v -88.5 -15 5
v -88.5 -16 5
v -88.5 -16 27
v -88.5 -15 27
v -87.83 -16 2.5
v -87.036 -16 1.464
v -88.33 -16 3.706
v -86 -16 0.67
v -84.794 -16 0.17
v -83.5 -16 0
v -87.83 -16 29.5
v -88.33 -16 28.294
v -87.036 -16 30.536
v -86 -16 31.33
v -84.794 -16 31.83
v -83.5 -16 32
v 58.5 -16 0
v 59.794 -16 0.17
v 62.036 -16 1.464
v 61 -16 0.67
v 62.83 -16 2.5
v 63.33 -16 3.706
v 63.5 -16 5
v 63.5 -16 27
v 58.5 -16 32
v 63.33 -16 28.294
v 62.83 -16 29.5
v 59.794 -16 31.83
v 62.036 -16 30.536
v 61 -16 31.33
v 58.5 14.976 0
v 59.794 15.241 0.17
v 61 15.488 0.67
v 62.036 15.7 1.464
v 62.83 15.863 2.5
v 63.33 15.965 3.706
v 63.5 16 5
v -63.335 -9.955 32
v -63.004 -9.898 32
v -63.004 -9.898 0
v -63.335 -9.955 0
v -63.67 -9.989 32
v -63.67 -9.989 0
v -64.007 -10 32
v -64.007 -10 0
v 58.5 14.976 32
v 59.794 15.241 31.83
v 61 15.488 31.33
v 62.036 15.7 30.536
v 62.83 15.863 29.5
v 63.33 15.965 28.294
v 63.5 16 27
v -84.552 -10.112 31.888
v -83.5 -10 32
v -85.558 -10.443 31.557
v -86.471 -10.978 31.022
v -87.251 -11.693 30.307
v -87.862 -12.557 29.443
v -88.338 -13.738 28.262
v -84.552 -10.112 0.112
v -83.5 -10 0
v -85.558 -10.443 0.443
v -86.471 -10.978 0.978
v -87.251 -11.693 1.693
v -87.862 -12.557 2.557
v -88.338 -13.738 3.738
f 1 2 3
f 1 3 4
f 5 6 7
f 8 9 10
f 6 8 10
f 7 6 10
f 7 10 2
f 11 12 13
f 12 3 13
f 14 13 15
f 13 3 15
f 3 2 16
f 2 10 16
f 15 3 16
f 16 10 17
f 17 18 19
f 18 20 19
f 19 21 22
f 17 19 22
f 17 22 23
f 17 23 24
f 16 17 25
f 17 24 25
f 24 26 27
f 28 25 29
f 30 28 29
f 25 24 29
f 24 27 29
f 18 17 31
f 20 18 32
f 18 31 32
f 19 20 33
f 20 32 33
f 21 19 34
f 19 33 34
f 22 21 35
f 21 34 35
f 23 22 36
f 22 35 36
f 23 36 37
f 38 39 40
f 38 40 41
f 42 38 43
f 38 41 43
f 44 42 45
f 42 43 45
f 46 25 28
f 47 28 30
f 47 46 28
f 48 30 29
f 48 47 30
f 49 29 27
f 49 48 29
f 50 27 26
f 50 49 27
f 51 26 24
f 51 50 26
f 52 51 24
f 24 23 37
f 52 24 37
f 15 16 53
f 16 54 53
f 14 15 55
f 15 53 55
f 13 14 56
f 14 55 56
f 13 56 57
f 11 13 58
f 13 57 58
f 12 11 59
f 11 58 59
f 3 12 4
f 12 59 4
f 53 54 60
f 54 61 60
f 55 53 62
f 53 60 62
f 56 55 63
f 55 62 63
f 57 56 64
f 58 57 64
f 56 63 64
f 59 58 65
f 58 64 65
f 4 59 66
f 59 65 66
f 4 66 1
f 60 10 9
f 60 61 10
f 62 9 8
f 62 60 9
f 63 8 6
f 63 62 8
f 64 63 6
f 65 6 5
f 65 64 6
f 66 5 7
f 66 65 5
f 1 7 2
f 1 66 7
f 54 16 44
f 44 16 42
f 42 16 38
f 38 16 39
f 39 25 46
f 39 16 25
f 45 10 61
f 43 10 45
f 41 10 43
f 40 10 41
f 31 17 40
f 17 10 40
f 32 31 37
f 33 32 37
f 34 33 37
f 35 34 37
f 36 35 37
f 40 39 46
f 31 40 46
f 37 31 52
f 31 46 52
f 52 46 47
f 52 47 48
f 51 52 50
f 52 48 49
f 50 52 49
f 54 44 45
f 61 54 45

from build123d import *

# Parameters (mm, degrees)
F0_W     = 127
F0_H     = 32
F1_DEPTH = 32
F3_DEPTH = 32
F4_DEPTH = 25
F5_R     = 5


with BuildPart() as f1:
    # F0 (on Top) → F1 (new body)
    with BuildSketch(Plane.XY):
        Rectangle(F0_W, F0_H)
    extrude(amount=F1_DEPTH)

    # F2 (on face) → F3 (cut, through all)
    with BuildSketch(Plane.XY.offset(32)):
        Polygon((-63.5, 16), (-63.5, -10), (63.5, 16), align=None)
    extrude(amount=-F3_DEPTH, mode=Mode.SUBTRACT)

    # F4 (add): a face of the model
    f4_faces = [f1.faces().sort_by_distance(p)[0] for p in [
        (-63.5, -13, 16),
    ]]
    extrude(f4_faces, amount=F4_DEPTH)

    # F5
    f5_edges = [f1.edges().sort_by_distance(p)[0] for p in [
        (63.5, 0, 32),
        (63.5, 0, 0),
        (-63.5, -10, 16),
        (-88.5, -10, 16),
        (-88.5, -13, 32),
        (-88.5, -13, 0),
    ]]
    fillet(f5_edges, radius=F5_R)


solid = f1.part
